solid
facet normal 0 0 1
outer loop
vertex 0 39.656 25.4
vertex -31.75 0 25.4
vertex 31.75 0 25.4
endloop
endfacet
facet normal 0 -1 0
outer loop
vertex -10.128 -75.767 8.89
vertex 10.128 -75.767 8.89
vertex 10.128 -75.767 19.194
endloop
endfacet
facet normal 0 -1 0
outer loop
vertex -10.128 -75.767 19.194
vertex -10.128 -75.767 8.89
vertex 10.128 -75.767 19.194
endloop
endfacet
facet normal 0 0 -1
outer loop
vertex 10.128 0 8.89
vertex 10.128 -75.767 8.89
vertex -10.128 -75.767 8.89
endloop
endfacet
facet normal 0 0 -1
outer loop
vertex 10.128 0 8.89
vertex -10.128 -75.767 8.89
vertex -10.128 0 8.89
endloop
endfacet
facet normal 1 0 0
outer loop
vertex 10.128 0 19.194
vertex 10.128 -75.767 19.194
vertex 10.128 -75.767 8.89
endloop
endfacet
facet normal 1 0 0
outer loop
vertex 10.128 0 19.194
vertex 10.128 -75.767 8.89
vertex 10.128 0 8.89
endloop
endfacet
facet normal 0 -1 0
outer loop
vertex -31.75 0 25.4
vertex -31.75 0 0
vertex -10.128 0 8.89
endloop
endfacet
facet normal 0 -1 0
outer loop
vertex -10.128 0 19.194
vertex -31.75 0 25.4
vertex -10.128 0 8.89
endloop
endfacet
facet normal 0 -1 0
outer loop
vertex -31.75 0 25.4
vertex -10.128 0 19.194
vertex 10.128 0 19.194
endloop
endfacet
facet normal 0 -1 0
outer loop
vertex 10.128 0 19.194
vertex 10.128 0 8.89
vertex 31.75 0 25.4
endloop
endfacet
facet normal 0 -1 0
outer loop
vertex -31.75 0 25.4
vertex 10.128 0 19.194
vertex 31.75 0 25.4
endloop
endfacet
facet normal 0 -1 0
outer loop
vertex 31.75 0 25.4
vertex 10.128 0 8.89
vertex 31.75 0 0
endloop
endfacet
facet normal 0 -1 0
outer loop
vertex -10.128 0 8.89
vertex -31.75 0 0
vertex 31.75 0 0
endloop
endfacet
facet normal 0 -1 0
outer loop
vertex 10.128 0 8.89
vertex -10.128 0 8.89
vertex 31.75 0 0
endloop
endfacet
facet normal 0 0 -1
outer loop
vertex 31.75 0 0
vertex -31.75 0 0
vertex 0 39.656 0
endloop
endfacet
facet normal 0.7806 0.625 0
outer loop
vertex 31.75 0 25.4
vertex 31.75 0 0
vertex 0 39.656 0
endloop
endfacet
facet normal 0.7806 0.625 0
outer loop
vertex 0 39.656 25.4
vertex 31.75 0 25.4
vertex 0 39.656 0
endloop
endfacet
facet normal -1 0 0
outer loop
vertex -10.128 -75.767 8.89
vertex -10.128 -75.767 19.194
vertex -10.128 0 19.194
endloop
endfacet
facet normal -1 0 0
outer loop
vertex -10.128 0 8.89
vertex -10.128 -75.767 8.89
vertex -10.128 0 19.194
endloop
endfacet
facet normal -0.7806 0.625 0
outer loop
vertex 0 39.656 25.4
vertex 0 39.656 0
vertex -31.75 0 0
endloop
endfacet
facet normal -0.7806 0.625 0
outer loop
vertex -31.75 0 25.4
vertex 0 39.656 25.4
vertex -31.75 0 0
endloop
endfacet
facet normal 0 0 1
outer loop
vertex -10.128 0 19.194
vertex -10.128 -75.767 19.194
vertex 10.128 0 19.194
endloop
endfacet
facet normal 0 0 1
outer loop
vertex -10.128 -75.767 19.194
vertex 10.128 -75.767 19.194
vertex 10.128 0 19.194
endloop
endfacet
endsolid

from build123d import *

# Parameters (mm, degrees)
F1_DEPTH = 25.4
F2_W     = 75.767048
F2_H     = 10.304318
F3_DEPTH = 10.12838


with BuildPart() as f1:
    # F0 (on Top) → F1 (new body)
    with BuildSketch(Plane.XY):
        Polygon((31.75, 0), (0, 39.655737), (-31.75, 0), align=None)
    extrude(amount=F1_DEPTH)

    # F2 (on Right) → F3 (join, symmetric)
    with BuildSketch(Plane.YZ):
        with Locations((-37.883524, 14.042159)):
            Rectangle(F2_W, F2_H)
    extrude(amount=F3_DEPTH, both=True)


solid = f1.part
